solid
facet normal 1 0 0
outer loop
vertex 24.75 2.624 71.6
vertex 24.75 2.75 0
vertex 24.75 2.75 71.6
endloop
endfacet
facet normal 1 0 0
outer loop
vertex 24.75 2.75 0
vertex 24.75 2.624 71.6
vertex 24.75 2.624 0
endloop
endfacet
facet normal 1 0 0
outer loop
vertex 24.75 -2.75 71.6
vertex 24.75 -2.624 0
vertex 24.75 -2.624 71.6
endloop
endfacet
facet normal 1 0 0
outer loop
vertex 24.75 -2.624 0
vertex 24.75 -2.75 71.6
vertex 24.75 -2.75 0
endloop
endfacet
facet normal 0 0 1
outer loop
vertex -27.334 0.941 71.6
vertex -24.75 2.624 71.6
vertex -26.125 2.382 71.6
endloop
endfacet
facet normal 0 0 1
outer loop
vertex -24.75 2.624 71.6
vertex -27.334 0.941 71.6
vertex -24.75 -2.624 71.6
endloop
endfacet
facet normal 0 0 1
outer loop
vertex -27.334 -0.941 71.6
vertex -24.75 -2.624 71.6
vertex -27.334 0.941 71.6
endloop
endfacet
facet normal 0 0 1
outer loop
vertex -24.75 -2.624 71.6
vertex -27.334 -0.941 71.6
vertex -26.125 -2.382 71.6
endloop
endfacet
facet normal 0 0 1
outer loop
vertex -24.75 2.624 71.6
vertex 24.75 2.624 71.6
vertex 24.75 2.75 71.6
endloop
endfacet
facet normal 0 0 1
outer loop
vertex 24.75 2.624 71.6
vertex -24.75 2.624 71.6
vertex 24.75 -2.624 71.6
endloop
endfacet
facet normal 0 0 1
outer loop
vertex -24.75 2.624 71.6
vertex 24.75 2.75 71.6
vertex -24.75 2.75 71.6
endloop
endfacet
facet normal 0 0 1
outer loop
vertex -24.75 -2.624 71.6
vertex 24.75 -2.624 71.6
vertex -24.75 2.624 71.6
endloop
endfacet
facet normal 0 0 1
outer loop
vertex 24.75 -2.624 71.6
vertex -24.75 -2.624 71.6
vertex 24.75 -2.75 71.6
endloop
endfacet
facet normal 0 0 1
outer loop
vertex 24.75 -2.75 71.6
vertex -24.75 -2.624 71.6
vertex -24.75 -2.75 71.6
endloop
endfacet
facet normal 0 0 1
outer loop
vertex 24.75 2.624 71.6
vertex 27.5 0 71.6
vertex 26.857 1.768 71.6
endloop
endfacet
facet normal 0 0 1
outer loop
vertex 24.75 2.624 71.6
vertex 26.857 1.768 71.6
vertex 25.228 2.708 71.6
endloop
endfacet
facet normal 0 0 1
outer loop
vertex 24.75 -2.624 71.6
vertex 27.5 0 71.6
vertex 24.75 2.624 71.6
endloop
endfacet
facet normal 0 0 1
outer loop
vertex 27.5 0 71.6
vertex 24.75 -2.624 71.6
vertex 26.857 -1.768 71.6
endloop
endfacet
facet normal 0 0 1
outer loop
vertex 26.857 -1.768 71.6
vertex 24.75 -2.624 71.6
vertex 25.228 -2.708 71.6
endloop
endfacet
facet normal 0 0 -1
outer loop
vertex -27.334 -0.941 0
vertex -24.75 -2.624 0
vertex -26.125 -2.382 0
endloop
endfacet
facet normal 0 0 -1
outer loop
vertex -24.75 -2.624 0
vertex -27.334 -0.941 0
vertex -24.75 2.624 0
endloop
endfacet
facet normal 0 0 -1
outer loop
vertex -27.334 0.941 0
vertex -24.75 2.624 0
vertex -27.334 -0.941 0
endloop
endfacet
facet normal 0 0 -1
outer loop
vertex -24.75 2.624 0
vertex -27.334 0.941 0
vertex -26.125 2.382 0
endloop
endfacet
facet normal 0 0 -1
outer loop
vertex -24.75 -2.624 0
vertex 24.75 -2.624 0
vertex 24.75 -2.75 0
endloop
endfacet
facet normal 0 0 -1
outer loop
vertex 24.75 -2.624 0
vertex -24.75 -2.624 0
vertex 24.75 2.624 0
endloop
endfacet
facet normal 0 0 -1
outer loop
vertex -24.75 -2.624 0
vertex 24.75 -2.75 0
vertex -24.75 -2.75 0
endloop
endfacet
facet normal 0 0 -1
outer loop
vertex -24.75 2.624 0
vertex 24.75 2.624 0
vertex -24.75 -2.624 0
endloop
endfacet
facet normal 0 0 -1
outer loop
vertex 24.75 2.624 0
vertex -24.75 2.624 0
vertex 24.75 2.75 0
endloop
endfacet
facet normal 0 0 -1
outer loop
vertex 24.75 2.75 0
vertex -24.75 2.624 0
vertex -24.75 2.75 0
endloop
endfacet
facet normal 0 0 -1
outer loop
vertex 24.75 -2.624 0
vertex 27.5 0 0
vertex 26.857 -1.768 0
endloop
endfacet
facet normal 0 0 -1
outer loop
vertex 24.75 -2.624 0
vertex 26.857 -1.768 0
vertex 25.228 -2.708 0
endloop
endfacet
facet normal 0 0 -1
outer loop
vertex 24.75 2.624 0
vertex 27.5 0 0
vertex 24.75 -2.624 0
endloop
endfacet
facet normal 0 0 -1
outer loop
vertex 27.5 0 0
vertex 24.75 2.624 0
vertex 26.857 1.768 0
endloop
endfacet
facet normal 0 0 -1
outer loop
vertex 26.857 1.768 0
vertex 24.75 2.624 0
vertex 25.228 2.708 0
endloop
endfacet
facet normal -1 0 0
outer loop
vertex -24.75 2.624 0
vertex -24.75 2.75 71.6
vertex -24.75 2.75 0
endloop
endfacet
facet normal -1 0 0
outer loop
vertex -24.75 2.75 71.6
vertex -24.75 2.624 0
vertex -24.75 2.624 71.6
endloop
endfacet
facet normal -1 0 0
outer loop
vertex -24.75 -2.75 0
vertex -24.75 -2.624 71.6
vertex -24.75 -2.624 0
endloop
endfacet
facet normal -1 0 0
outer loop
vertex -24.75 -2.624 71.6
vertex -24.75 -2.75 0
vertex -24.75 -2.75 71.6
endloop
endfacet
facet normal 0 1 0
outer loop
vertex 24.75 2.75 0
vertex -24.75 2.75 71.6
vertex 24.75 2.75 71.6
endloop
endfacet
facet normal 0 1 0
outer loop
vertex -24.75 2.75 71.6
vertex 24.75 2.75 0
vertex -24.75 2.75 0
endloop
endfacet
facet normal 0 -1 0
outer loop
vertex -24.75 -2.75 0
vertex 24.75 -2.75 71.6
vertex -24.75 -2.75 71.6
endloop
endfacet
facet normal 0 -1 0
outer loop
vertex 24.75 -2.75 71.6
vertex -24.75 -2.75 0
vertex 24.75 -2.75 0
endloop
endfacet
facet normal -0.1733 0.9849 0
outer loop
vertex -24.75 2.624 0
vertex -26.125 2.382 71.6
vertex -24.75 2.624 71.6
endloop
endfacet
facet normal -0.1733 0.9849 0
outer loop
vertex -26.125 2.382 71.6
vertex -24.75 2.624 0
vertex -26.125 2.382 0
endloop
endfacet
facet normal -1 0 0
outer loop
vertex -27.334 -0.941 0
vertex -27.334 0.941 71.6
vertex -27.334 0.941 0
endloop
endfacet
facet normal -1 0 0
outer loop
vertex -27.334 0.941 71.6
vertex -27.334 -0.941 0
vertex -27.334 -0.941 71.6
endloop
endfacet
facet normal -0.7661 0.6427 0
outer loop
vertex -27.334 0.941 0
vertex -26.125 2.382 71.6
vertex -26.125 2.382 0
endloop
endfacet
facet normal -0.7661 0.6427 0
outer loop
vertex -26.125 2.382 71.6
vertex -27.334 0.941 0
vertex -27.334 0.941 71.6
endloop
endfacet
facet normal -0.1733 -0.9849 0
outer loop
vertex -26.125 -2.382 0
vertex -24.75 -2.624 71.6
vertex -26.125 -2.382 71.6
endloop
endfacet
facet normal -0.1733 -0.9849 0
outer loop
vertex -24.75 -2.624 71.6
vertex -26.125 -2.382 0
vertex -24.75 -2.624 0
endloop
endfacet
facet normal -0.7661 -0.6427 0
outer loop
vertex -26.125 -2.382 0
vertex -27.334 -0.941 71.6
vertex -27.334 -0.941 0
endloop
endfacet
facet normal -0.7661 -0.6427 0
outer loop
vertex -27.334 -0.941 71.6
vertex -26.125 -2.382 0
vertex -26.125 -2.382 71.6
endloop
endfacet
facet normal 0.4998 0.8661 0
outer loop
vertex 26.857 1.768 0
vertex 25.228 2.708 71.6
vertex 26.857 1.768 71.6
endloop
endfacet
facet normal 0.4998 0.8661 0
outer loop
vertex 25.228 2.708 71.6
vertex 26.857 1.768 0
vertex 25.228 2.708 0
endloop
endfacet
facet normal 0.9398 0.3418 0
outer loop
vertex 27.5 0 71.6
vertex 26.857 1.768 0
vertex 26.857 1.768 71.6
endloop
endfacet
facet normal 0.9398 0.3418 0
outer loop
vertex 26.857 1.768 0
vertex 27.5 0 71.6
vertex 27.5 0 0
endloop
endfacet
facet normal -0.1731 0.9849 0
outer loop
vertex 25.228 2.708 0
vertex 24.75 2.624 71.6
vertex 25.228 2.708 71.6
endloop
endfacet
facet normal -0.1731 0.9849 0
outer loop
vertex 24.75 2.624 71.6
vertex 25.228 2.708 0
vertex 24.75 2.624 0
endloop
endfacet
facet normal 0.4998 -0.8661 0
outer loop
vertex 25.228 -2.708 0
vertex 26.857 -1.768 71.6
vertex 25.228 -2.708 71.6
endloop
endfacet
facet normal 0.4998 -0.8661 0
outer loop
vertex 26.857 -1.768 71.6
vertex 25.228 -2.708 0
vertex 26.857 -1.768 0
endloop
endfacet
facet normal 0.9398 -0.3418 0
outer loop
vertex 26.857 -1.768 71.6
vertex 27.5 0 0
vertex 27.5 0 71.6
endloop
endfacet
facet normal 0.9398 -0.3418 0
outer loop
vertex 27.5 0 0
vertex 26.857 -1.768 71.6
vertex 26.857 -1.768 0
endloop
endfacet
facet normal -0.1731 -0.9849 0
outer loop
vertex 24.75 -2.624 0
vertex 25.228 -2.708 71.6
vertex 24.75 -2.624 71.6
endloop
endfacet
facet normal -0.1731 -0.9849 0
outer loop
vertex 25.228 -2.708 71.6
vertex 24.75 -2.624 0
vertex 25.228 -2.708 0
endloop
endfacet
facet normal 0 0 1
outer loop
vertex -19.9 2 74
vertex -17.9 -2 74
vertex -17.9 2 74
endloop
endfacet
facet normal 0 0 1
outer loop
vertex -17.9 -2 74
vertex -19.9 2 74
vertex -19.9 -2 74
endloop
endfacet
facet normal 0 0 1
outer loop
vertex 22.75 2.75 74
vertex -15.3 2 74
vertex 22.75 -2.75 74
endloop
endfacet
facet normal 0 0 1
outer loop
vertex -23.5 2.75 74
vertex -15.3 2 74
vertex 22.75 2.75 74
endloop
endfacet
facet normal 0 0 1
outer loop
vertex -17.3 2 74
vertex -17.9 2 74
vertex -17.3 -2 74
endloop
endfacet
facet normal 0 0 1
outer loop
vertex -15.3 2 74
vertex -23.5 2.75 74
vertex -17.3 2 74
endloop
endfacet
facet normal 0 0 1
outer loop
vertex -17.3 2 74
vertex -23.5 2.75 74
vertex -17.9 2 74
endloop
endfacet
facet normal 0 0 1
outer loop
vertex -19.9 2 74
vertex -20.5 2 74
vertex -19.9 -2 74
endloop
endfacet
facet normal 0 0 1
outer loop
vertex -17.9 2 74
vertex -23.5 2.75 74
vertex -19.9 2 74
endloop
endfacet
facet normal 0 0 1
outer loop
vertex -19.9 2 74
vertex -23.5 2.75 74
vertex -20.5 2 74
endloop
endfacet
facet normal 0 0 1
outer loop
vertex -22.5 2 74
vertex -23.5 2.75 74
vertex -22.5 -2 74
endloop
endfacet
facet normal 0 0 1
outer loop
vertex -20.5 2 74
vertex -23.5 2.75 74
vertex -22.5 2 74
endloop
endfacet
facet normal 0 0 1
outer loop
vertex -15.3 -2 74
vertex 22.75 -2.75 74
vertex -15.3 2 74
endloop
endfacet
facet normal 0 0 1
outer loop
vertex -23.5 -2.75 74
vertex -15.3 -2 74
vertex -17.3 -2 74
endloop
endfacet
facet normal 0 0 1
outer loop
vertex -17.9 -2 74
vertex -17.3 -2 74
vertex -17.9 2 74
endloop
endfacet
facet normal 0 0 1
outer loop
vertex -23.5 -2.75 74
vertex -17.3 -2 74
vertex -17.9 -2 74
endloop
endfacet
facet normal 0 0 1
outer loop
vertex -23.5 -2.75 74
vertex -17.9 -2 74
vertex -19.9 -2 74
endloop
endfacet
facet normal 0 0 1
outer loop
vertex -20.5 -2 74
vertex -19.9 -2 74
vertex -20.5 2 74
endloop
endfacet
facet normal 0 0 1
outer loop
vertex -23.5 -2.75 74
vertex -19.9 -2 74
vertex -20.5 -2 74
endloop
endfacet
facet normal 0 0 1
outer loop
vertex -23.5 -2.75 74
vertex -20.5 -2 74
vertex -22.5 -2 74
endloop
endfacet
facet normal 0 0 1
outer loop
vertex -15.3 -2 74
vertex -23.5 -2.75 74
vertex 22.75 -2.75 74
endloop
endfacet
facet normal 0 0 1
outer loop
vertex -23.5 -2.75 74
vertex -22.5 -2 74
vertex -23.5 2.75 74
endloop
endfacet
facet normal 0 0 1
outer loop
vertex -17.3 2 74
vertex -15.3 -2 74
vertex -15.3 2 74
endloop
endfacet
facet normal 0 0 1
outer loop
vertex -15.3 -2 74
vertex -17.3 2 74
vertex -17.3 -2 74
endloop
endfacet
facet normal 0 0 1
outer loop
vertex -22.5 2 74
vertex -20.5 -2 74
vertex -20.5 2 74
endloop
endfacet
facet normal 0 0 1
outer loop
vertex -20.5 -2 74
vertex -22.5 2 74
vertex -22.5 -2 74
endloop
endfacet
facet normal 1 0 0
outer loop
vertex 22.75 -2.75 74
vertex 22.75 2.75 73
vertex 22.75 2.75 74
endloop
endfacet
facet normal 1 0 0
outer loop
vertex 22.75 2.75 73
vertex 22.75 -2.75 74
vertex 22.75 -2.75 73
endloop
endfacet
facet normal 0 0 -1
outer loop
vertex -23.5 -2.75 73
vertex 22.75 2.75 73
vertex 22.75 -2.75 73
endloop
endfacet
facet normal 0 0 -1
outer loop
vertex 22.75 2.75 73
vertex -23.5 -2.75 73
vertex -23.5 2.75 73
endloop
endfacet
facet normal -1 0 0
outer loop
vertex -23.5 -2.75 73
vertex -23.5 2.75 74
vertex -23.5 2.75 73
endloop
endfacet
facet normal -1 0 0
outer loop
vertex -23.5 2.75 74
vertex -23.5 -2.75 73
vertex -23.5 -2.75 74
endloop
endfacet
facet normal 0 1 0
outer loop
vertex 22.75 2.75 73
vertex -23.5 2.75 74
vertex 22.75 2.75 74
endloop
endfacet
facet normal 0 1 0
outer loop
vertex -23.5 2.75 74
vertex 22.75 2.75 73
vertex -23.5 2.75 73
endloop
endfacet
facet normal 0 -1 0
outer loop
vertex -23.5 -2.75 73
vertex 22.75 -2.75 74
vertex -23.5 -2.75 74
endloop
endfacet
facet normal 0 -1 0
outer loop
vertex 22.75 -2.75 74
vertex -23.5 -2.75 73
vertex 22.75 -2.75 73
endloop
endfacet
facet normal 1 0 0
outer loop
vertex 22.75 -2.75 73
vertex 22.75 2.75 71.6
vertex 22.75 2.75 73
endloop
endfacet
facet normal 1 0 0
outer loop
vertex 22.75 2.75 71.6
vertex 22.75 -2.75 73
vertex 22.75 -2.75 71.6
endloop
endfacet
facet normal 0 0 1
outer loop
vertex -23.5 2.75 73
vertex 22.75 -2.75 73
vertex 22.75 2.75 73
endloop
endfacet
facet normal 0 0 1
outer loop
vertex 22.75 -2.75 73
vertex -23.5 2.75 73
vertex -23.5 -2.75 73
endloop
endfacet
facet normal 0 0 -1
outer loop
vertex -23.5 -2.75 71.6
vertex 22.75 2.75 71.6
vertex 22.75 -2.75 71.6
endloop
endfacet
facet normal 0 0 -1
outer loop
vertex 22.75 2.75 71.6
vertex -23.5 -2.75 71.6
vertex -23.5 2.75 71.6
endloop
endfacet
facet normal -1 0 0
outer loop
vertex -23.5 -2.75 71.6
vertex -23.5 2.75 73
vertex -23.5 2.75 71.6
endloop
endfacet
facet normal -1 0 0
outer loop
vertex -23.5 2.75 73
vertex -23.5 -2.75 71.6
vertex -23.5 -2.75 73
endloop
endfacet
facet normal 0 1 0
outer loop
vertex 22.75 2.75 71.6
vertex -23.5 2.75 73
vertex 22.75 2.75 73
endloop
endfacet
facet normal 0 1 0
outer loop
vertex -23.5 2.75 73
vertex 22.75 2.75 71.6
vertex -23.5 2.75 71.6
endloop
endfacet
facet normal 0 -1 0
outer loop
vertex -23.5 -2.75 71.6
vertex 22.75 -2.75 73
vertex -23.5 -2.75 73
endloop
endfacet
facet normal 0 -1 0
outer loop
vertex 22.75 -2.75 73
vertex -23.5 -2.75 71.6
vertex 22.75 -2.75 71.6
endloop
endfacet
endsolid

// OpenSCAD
/*
Samsung SDI
3100 mAh
3.8 V (actually 4.12 V at full charge)
Li-Ion,
upper part is 45.1 wide
height without upper part 71.5
plus is left, minus is right
*/


module bank_body(h=74, w=55, d=5.5){
	r = d/2;
	translate([r, 0, 0]){
		union(){
			wCubic = w-d;
			cube([wCubic, d, h]);
			translate([0, +r, 0])
				cylinder(r=r, h=h);
			translate([wCubic, +r,0])
				cylinder(r=r, h=h);
		}
	}
}

module contactGroup(contactW=2, contactD=4, contactSeparation=0.6, contactGoldLayer=1e-5, contactsLeftOffset=1, contactsCount=3){
	translate([contactsLeftOffset, - contactD/2, 0]){
		color("gold"){
			cube([contactW, contactD, contactGoldLayer]);
			for(i = [1:contactsCount - 1]){
				translate([i * (contactW + contactSeparation),0,0]){
					cube([contactW, contactD, contactGoldLayer]);
				}
			}
		}
	}
}

module bank(h=74, w=55, d=6, left=4, right=6, upperPartTotalHeight=2.4, pcbThickness=1){
	wCubic = w-d;
	r = d/2;
	translate([-w/2,-d/2,]){
		union(){
			color("#7B9095"){
				bank_body(h=h-upperPartTotalHeight, w=w, d=d);
			}
			translate([0,0, h - upperPartTotalHeight]){
				legsHeight=upperPartTotalHeight-pcbThickness;
				translate([left,0,0]){
					pcbLen=wCubic - right + r;
					color("#444")
						cube([pcbLen, d, legsHeight]);
					translate([0,0,legsHeight]){
						color("green")
							cube([pcbLen, d, pcbThickness]);
						// Position of contacts is inaccurate, need measure and offset them
						translate([0,d/2,pcbThickness]){
							contactGroup();
						}
					}
				}
			}
		}
		//line([3.5, 0, 1.2], [[1, 0, 3.6]])  # and reflected
	}
}

module cap(w=55, id=5.3, od=5.9, innerPlaceForUpperPartD=4.65, innerPlaceForUpperPartH=0.31, pinW=1.75, flatPartOuter=50, thinWallThickness=0.15, thickWallThickness=0.55){
	wCubic = w-od;
	translate([-w/2,-od/2, - innerPlaceForUpperPartH]){
		color("red", alpha=0.5){
			difference(){
				bank_body(h=1, w=w, d=od);
				echo(innerPlaceForUpperPartD, od - 2*thickWallThickness);
				translate([0, od/2 - innerPlaceForUpperPartD/2,0]){
					cube([flatPartOuter - 2*thickWallThickness, innerPlaceForUpperPartD, innerPlaceForUpperPartH]);
				}
			}
		}
	}
	echo("big vertical wall length calculated:", wCubic);
}

module bottom(h=0.8, w=55, d=5.5){
	color("black")
		translate([-w/2,-d/2,]){
			bank_body(h=h, w=w, d=d);
		}
}

module accum(h=74, w=55, d=5.5){
	translate([0,0,h+0]){
		//cap(w=w);
	}
	bank(h=h, w=w, d=d);
	translate([0,0,0-0]){
		bottom(h=1, w=w, d=d);
	}
}

module phone(h=151, w=81, d=10, bcH=75.2, bcW=55.5, bcD=5.5, bottomOffset=23, leftOffset=14){
	color("silver")
	translate([-w/2, -d/2 + bcD/2, -bottomOffset]){
		difference(){
			translate([0, 0, 0]){
				cube([w, d, h]);
			}
			translate([leftOffset, -bcD/2, bottomOffset]){
				cube([bcW, bcD, bcH]);
			}
		}
	}
}

module phoneWithAccum(bottomOffset=23, leftOffset=14){
	phone(bottomOffset=bottomOffset, leftOffset=leftOffset);
	accum();
}

accum();
